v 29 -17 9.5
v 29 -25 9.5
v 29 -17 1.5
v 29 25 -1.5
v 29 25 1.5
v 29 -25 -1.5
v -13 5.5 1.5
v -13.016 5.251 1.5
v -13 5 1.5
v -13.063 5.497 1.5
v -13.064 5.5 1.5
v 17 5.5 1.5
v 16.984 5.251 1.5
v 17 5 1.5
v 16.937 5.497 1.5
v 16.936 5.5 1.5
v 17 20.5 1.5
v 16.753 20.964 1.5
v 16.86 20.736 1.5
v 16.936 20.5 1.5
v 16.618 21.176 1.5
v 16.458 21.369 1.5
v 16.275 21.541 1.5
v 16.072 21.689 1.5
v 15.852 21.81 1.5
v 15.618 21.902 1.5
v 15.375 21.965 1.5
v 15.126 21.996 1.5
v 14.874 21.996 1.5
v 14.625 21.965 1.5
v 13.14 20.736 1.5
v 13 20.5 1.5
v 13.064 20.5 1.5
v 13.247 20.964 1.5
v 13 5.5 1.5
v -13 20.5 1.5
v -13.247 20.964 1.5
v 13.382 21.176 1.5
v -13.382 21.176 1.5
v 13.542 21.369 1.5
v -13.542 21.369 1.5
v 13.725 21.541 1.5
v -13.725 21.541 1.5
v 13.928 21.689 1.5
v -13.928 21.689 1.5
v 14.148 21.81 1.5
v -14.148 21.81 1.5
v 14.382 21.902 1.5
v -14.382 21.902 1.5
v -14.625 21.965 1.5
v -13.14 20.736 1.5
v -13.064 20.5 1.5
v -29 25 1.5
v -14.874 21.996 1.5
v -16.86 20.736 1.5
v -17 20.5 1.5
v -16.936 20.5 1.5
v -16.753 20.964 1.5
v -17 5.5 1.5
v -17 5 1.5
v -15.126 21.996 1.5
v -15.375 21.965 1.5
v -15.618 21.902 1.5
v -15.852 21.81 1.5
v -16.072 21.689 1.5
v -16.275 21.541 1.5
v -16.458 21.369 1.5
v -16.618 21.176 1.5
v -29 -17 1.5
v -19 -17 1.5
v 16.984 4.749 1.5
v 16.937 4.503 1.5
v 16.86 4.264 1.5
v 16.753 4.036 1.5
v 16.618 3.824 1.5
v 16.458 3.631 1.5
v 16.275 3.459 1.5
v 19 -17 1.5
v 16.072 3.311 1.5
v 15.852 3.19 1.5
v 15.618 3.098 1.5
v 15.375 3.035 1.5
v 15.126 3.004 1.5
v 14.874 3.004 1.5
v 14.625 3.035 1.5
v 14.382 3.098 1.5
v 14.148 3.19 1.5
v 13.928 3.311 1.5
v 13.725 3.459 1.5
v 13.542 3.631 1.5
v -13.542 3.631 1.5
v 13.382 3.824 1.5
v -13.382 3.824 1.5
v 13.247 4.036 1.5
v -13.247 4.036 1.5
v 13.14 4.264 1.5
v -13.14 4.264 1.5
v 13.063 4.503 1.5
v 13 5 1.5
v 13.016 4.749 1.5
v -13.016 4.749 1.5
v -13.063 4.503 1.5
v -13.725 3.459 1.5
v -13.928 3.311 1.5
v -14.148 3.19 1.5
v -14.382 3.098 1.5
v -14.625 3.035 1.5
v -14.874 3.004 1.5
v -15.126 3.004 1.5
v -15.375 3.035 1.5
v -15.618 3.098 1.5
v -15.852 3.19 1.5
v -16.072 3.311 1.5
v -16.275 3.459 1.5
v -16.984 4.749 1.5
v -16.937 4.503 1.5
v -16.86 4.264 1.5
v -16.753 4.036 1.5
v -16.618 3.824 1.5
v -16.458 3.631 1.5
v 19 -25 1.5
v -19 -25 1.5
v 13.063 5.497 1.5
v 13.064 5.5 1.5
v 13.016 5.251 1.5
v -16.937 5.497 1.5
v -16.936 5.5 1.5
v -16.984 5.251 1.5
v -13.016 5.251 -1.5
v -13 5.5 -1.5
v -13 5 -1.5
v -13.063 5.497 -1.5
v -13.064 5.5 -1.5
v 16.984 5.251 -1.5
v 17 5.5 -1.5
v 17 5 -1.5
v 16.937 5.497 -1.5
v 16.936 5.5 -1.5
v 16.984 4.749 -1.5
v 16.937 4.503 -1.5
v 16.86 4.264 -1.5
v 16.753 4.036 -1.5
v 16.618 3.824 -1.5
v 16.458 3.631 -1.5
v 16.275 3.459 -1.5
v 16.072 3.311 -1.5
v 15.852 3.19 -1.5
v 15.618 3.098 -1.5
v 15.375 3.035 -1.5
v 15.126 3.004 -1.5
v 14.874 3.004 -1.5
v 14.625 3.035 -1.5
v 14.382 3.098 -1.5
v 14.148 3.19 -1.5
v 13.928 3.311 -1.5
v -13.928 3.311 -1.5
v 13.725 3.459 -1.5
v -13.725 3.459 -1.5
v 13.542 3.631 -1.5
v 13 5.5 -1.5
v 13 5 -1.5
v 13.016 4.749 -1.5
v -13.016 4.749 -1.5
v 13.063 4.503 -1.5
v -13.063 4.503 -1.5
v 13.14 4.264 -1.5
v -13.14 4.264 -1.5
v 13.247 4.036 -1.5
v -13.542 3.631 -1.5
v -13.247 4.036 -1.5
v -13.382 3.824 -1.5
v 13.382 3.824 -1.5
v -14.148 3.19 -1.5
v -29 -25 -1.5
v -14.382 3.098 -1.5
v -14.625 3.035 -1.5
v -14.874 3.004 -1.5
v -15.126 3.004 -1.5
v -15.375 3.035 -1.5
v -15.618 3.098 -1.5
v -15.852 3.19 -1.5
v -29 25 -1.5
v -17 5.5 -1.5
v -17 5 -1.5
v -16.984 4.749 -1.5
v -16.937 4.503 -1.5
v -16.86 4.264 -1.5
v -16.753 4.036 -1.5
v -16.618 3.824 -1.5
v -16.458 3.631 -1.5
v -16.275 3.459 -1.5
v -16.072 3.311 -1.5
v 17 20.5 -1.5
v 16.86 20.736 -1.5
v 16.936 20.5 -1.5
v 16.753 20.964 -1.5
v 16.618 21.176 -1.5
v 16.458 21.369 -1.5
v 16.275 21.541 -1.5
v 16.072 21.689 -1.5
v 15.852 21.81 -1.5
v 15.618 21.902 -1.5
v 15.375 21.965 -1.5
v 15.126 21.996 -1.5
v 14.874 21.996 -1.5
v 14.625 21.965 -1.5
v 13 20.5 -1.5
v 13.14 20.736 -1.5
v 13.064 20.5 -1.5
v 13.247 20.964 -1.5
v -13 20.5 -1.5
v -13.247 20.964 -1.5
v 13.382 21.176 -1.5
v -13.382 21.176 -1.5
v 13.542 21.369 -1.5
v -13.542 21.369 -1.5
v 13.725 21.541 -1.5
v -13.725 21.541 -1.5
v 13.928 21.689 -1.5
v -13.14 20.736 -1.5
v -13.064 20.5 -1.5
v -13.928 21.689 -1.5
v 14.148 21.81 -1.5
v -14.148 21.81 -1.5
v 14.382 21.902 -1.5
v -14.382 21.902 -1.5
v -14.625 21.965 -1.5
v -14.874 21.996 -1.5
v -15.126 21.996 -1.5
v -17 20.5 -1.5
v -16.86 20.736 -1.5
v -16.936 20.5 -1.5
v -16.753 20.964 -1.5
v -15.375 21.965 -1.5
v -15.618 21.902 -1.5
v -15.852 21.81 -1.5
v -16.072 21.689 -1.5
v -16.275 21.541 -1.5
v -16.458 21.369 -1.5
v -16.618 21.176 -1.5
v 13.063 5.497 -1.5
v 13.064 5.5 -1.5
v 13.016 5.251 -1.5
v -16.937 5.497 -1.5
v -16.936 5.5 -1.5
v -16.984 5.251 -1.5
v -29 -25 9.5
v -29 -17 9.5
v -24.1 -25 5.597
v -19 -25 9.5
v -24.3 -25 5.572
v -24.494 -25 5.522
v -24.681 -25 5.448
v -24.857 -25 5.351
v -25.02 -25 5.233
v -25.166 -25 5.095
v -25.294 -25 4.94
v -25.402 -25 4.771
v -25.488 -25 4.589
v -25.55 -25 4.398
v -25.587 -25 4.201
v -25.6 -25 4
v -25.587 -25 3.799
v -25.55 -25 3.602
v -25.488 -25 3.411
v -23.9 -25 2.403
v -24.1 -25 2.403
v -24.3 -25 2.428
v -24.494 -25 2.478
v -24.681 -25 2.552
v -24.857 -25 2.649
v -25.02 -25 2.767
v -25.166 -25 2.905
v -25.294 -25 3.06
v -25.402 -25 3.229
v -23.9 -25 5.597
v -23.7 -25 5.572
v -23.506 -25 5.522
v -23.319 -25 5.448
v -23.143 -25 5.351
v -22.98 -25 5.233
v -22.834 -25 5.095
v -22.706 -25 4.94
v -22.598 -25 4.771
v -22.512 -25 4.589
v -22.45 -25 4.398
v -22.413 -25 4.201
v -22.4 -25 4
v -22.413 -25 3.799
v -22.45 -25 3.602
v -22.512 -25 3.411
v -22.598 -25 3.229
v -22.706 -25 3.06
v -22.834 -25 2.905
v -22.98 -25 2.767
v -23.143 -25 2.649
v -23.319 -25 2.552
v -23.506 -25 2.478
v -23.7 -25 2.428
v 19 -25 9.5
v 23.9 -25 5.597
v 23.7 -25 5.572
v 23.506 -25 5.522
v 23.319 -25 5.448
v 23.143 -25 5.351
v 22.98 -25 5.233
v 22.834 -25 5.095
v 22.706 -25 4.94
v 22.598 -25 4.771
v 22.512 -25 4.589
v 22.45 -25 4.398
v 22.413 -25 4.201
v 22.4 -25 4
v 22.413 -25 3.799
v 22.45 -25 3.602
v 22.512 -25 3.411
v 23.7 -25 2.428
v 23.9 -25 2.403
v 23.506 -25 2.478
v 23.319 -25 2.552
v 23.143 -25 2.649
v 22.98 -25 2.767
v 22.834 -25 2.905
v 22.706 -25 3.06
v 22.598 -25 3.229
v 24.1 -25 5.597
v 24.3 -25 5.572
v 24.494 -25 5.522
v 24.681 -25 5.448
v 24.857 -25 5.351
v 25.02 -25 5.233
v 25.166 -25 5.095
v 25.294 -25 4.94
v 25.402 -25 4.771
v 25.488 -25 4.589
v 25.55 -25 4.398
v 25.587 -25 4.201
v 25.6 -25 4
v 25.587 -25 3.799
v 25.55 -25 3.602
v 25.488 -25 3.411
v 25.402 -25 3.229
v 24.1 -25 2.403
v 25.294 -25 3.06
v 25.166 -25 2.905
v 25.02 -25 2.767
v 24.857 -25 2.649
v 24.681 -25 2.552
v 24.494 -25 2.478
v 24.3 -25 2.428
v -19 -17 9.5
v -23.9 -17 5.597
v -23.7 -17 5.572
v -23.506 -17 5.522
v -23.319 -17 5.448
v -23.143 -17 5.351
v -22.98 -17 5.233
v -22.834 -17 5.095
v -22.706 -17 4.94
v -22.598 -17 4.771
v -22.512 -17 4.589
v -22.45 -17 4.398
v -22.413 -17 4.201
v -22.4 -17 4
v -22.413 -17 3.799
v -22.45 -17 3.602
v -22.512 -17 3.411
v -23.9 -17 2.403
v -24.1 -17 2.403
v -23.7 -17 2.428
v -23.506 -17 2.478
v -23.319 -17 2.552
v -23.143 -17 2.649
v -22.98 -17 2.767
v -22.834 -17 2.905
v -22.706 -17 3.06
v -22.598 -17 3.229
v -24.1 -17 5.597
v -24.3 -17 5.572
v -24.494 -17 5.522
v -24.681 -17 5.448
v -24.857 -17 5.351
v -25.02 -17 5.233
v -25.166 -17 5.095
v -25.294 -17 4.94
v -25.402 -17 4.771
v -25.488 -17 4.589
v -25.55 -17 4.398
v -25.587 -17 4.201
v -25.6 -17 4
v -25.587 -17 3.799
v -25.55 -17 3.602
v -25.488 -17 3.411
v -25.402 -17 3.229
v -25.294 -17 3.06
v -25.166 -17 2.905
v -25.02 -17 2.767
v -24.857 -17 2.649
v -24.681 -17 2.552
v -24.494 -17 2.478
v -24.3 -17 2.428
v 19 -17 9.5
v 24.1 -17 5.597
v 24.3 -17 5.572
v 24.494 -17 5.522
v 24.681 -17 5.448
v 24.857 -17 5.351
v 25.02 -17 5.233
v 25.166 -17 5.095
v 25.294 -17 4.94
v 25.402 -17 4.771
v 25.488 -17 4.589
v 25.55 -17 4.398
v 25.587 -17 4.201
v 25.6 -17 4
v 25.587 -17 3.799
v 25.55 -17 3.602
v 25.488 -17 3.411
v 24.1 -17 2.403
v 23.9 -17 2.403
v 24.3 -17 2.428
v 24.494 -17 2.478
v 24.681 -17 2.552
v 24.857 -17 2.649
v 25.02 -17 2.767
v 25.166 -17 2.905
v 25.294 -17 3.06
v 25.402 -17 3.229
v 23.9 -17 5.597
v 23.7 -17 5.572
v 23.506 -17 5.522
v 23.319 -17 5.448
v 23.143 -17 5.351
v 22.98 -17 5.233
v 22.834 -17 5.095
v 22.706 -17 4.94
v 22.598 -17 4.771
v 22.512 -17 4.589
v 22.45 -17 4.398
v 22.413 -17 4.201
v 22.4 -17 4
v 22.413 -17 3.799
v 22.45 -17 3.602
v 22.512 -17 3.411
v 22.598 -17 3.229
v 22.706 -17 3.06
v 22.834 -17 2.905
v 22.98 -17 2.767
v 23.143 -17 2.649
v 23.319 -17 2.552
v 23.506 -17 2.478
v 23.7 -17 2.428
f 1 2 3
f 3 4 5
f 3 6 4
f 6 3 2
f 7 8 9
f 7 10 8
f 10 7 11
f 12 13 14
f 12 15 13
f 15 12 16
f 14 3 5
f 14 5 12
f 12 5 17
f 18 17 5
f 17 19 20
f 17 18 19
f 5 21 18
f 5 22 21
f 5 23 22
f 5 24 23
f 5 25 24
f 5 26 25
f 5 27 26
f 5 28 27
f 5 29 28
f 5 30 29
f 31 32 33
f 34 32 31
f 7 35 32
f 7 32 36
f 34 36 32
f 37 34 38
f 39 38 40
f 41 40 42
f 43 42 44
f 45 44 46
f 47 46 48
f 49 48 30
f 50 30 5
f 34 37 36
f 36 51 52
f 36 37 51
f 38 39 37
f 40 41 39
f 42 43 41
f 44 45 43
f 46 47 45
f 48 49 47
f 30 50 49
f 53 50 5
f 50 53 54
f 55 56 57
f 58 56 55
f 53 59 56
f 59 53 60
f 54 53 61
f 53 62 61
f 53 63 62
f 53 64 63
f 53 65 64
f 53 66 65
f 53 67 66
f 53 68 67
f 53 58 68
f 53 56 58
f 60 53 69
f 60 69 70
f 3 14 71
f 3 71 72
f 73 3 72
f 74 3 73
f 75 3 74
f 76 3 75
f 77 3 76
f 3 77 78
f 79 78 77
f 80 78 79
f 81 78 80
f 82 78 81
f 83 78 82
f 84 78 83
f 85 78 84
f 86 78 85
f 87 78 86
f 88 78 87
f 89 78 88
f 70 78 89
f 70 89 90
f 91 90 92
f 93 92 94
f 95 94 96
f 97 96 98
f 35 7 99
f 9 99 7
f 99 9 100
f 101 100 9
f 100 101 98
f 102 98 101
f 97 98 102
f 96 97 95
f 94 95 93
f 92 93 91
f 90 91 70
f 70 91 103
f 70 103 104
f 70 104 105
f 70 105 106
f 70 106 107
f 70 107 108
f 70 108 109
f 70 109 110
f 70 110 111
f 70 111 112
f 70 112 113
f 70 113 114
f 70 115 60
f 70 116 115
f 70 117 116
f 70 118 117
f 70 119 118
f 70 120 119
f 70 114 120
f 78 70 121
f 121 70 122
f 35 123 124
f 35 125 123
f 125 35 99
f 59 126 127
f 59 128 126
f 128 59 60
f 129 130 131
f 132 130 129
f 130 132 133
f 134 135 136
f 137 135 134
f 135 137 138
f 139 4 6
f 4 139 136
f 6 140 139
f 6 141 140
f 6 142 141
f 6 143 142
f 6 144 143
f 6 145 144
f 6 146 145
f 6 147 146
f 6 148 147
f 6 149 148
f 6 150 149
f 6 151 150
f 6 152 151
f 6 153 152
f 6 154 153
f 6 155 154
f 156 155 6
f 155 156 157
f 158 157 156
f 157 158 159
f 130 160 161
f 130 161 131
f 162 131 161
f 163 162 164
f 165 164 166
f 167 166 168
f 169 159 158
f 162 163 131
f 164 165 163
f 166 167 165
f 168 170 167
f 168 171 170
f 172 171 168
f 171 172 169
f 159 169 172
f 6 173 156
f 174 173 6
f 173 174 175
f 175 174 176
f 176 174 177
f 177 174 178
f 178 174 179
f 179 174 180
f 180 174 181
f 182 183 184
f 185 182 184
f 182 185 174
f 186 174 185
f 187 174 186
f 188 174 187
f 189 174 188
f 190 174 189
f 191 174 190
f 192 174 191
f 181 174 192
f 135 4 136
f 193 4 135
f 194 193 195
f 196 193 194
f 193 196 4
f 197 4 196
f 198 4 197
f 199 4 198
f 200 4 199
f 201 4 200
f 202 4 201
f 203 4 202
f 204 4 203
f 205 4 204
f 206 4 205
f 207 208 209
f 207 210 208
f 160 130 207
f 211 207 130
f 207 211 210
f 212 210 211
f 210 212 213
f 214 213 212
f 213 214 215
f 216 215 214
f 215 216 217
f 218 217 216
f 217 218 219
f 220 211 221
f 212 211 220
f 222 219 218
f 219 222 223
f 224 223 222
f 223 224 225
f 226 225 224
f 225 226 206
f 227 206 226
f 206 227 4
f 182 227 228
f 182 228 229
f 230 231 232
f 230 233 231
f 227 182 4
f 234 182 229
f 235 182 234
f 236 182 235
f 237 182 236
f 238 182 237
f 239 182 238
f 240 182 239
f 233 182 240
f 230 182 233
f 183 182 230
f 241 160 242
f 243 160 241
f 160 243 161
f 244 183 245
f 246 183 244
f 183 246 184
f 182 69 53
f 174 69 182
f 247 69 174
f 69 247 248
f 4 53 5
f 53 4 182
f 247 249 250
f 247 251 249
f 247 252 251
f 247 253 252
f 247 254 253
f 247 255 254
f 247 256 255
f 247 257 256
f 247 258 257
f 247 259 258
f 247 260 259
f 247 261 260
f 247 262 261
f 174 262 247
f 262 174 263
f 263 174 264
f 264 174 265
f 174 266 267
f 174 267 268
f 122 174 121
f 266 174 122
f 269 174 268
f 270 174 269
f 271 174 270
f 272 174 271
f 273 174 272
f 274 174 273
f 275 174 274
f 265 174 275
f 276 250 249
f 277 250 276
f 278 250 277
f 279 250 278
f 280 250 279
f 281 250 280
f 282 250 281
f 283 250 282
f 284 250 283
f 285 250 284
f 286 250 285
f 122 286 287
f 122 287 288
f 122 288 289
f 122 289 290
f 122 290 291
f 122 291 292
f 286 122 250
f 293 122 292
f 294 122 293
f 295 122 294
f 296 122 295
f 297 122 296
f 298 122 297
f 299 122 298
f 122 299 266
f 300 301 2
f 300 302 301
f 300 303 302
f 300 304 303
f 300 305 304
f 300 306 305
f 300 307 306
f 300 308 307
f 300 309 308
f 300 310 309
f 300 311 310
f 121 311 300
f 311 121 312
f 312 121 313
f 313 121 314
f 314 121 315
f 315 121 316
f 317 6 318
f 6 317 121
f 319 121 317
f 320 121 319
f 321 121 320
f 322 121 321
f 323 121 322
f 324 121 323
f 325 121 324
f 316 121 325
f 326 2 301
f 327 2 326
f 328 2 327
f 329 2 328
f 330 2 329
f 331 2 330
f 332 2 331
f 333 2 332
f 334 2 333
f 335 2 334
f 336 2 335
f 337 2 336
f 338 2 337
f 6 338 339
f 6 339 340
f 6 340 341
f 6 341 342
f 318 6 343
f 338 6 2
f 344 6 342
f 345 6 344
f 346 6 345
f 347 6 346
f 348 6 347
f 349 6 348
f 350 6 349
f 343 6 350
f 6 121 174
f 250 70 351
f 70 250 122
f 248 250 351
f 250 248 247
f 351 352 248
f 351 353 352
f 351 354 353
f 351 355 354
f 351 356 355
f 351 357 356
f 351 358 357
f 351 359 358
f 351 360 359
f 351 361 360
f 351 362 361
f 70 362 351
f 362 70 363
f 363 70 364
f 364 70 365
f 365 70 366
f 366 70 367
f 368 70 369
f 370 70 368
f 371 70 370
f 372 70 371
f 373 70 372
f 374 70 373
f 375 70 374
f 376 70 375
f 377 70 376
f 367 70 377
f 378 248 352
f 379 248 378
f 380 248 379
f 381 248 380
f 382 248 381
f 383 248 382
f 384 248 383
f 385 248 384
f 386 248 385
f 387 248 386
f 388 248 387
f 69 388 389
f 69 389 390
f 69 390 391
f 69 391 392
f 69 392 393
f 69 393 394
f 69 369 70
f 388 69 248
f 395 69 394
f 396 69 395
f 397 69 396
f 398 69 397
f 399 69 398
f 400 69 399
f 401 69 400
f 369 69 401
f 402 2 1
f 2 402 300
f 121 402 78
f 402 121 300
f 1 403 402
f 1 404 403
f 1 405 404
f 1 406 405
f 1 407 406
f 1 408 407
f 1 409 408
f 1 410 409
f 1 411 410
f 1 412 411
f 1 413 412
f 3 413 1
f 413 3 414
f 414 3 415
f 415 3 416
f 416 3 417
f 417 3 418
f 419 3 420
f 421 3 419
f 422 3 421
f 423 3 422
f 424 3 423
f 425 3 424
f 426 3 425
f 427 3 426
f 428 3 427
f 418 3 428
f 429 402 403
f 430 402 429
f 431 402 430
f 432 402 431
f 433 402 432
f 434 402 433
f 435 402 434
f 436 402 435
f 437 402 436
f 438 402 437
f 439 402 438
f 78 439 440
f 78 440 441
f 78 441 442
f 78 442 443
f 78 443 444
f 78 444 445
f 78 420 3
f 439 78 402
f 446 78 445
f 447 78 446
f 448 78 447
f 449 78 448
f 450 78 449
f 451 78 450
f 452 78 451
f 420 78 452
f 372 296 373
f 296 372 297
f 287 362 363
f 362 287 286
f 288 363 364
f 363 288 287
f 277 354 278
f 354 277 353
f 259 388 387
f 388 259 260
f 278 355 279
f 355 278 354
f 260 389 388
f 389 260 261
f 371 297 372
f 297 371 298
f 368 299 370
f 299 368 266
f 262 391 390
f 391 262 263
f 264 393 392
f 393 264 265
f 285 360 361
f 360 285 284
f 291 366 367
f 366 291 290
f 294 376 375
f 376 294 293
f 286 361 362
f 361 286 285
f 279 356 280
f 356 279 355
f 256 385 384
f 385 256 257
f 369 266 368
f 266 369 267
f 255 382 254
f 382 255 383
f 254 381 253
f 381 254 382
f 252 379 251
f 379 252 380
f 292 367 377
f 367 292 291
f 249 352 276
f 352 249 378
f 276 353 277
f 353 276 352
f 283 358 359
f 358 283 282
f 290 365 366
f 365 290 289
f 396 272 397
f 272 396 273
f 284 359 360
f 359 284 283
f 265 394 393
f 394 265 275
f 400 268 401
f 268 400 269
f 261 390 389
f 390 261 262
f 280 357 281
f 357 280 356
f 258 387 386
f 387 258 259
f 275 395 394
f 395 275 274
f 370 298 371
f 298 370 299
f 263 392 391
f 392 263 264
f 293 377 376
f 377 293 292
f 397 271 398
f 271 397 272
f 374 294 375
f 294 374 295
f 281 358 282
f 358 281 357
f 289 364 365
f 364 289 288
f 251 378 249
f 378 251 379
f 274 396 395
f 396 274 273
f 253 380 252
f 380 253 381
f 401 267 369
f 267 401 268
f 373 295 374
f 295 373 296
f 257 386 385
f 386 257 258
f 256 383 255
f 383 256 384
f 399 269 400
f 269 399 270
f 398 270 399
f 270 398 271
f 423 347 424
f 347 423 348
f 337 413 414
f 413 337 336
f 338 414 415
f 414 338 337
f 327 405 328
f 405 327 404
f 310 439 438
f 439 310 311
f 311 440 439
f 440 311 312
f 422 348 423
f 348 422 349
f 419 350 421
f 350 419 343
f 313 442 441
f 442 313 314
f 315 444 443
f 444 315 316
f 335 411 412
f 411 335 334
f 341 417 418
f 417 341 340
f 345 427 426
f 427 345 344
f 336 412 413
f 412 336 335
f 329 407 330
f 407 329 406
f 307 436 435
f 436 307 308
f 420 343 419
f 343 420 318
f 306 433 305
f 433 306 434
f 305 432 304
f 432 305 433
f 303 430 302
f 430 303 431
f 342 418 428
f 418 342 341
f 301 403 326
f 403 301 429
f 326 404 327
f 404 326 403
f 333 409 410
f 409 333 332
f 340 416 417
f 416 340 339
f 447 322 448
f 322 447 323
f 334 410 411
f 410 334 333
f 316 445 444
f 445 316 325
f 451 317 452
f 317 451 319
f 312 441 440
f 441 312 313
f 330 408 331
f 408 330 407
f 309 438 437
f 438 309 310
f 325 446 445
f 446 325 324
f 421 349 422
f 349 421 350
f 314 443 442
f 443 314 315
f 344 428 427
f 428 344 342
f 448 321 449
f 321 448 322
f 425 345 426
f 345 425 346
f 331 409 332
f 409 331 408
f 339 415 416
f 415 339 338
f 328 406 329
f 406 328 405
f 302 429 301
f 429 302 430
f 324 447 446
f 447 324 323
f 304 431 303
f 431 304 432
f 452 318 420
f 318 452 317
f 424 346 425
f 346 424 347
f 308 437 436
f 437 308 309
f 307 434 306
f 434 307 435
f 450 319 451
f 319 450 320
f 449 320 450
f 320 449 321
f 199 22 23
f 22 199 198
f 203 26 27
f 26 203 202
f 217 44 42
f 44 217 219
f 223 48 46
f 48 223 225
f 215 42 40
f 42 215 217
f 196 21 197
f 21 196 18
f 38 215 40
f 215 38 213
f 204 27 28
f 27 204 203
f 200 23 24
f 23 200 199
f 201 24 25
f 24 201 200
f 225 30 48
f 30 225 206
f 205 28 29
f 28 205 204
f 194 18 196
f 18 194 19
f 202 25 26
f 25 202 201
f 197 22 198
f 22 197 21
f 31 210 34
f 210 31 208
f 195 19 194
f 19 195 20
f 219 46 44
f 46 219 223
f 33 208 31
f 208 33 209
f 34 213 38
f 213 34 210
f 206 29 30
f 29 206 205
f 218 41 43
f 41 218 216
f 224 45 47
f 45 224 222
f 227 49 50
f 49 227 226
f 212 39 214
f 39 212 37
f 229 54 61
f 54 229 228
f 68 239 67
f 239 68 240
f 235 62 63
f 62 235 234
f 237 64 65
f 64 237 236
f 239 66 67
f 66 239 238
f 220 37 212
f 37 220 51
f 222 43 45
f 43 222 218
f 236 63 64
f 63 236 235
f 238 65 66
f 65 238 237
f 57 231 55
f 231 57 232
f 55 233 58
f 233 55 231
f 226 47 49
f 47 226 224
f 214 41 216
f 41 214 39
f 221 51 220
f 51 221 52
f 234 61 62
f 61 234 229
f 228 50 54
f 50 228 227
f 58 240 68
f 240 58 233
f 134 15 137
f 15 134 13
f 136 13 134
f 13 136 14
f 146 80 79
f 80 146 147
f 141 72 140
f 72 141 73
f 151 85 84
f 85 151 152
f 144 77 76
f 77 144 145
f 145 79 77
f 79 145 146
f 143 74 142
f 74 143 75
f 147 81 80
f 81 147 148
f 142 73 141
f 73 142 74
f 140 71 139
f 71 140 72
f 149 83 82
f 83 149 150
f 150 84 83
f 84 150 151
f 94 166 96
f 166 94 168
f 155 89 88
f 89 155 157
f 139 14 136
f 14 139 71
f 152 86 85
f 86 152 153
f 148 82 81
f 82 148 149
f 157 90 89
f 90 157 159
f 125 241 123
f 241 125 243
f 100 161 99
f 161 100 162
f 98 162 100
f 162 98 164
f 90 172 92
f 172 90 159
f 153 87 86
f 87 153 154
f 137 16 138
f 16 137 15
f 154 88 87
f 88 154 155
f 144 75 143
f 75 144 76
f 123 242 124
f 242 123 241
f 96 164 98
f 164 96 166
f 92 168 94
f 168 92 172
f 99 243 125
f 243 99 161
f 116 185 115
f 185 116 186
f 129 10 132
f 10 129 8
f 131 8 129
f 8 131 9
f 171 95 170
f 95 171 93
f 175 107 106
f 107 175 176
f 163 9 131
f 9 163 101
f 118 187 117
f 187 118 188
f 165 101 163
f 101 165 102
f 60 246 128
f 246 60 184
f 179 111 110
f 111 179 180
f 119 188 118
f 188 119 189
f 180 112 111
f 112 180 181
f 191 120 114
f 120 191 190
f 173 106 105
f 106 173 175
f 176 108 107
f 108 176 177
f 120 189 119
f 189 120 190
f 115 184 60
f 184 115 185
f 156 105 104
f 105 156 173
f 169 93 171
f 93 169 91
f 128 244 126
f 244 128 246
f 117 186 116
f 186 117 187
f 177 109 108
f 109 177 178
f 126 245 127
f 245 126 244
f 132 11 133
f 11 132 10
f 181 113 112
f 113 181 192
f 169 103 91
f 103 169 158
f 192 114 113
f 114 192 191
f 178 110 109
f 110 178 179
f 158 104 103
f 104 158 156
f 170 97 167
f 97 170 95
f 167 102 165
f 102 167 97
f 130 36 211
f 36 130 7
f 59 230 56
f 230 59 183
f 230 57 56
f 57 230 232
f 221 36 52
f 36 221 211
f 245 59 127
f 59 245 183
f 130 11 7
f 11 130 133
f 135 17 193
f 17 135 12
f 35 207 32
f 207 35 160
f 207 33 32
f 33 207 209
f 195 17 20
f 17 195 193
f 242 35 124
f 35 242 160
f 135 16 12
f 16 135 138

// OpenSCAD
// meter plate
//  -- derived from /corsair_mount/meter_plate
//  BUT NOT A COPY -- if you need the original
//     go back to /corsair_mount
//     this is a 'branch'

// thread the mounting block
// pass-through the plate (vertically

//DELETE rail_width = 20;

plate_x = 46 + 12;
plate_y = 50;
plate_z = 3;

deck_mouunt_centerline = 30;

mounting_block_x = 10;
mounting_block_y = 8;
mounting_block_z = 8;

bezel_thickness = plate_z;

m4_pilot = 3.2;
m4_dia = 4;

vert_m4_x_offset = 15;

$fn = 50;

difference () {
    {
    union () {
        cube([plate_x, plate_y, plate_z], center = true);
        
        // mounting block
        translate([-plate_x/2 + mounting_block_x/2,
            -plate_y/2 + mounting_block_y/2,
            plate_z/2 +  mounting_block_z/2])
        cube([mounting_block_x, mounting_block_y, mounting_block_z], center = true);
        
        // mounting block
        translate([plate_x/2 - mounting_block_x/2,
            -plate_y/2 +  mounting_block_y/2,
            plate_z/2 +  mounting_block_z/2])
        cube([mounting_block_x, mounting_block_y, mounting_block_z], center = true);
        }
    }
    // subtract
    {
        // threaded mounting holes
        echo ("mounting hole center from deck surface", plate_z/2 + mounting_block_z/2 - 1.5);
        translate([-(plate_x/2 - mounting_block_x/2),
            -(plate_y/2  - mounting_block_y/2) ,
            plate_z/2 + mounting_block_z/2 - 1.5])
        rotate([90,0,0])
        cylinder(r = m4_pilot/2, h = mounting_block_y, center = true);
        
        translate([(plate_x/2 - mounting_block_x/2),
            -(plate_y/2 - mounting_block_y/2) ,
            plate_z/2 + mounting_block_z/2 - 1.5])
        rotate([90,0,0])
        cylinder(r = m4_pilot/2, h = mounting_block_y, center = true);
        // pass thru mounting holes
        
        // pass-thru holes 
        // outboard
        translate([vert_m4_x_offset,
            (plate_y/2  - 5),
            0])
        cylinder(r = m4_dia/2, h = plate_z, center = true);
        
        translate([-vert_m4_x_offset,
            (plate_y/2 - 5),
            0])
        cylinder(r = m4_dia/2, h = plate_z, center = true);
        // inboard
        translate([vert_m4_x_offset,
            (plate_y/2 - 20),
            0])
        cylinder(r = m4_dia/2, h = plate_z, center = true);
        
        translate([-vert_m4_x_offset,
            (plate_y/2 - 20),
            0])
        cylinder(r = m4_dia/2, h = plate_z, center = true);    
        // slots
        translate([-vert_m4_x_offset,
            (plate_y/2 - (20-5)/2 - (20-5)/2 + 3 ),
            0])
        cube([m4_dia, 15, plate_z], center = true);

        translate([vert_m4_x_offset,
            (plate_y/2 - (20-5)/2 - (20-5)/2 + 3 ),
            0])
        cube([m4_dia, 15, plate_z], center = true);
    }
}
